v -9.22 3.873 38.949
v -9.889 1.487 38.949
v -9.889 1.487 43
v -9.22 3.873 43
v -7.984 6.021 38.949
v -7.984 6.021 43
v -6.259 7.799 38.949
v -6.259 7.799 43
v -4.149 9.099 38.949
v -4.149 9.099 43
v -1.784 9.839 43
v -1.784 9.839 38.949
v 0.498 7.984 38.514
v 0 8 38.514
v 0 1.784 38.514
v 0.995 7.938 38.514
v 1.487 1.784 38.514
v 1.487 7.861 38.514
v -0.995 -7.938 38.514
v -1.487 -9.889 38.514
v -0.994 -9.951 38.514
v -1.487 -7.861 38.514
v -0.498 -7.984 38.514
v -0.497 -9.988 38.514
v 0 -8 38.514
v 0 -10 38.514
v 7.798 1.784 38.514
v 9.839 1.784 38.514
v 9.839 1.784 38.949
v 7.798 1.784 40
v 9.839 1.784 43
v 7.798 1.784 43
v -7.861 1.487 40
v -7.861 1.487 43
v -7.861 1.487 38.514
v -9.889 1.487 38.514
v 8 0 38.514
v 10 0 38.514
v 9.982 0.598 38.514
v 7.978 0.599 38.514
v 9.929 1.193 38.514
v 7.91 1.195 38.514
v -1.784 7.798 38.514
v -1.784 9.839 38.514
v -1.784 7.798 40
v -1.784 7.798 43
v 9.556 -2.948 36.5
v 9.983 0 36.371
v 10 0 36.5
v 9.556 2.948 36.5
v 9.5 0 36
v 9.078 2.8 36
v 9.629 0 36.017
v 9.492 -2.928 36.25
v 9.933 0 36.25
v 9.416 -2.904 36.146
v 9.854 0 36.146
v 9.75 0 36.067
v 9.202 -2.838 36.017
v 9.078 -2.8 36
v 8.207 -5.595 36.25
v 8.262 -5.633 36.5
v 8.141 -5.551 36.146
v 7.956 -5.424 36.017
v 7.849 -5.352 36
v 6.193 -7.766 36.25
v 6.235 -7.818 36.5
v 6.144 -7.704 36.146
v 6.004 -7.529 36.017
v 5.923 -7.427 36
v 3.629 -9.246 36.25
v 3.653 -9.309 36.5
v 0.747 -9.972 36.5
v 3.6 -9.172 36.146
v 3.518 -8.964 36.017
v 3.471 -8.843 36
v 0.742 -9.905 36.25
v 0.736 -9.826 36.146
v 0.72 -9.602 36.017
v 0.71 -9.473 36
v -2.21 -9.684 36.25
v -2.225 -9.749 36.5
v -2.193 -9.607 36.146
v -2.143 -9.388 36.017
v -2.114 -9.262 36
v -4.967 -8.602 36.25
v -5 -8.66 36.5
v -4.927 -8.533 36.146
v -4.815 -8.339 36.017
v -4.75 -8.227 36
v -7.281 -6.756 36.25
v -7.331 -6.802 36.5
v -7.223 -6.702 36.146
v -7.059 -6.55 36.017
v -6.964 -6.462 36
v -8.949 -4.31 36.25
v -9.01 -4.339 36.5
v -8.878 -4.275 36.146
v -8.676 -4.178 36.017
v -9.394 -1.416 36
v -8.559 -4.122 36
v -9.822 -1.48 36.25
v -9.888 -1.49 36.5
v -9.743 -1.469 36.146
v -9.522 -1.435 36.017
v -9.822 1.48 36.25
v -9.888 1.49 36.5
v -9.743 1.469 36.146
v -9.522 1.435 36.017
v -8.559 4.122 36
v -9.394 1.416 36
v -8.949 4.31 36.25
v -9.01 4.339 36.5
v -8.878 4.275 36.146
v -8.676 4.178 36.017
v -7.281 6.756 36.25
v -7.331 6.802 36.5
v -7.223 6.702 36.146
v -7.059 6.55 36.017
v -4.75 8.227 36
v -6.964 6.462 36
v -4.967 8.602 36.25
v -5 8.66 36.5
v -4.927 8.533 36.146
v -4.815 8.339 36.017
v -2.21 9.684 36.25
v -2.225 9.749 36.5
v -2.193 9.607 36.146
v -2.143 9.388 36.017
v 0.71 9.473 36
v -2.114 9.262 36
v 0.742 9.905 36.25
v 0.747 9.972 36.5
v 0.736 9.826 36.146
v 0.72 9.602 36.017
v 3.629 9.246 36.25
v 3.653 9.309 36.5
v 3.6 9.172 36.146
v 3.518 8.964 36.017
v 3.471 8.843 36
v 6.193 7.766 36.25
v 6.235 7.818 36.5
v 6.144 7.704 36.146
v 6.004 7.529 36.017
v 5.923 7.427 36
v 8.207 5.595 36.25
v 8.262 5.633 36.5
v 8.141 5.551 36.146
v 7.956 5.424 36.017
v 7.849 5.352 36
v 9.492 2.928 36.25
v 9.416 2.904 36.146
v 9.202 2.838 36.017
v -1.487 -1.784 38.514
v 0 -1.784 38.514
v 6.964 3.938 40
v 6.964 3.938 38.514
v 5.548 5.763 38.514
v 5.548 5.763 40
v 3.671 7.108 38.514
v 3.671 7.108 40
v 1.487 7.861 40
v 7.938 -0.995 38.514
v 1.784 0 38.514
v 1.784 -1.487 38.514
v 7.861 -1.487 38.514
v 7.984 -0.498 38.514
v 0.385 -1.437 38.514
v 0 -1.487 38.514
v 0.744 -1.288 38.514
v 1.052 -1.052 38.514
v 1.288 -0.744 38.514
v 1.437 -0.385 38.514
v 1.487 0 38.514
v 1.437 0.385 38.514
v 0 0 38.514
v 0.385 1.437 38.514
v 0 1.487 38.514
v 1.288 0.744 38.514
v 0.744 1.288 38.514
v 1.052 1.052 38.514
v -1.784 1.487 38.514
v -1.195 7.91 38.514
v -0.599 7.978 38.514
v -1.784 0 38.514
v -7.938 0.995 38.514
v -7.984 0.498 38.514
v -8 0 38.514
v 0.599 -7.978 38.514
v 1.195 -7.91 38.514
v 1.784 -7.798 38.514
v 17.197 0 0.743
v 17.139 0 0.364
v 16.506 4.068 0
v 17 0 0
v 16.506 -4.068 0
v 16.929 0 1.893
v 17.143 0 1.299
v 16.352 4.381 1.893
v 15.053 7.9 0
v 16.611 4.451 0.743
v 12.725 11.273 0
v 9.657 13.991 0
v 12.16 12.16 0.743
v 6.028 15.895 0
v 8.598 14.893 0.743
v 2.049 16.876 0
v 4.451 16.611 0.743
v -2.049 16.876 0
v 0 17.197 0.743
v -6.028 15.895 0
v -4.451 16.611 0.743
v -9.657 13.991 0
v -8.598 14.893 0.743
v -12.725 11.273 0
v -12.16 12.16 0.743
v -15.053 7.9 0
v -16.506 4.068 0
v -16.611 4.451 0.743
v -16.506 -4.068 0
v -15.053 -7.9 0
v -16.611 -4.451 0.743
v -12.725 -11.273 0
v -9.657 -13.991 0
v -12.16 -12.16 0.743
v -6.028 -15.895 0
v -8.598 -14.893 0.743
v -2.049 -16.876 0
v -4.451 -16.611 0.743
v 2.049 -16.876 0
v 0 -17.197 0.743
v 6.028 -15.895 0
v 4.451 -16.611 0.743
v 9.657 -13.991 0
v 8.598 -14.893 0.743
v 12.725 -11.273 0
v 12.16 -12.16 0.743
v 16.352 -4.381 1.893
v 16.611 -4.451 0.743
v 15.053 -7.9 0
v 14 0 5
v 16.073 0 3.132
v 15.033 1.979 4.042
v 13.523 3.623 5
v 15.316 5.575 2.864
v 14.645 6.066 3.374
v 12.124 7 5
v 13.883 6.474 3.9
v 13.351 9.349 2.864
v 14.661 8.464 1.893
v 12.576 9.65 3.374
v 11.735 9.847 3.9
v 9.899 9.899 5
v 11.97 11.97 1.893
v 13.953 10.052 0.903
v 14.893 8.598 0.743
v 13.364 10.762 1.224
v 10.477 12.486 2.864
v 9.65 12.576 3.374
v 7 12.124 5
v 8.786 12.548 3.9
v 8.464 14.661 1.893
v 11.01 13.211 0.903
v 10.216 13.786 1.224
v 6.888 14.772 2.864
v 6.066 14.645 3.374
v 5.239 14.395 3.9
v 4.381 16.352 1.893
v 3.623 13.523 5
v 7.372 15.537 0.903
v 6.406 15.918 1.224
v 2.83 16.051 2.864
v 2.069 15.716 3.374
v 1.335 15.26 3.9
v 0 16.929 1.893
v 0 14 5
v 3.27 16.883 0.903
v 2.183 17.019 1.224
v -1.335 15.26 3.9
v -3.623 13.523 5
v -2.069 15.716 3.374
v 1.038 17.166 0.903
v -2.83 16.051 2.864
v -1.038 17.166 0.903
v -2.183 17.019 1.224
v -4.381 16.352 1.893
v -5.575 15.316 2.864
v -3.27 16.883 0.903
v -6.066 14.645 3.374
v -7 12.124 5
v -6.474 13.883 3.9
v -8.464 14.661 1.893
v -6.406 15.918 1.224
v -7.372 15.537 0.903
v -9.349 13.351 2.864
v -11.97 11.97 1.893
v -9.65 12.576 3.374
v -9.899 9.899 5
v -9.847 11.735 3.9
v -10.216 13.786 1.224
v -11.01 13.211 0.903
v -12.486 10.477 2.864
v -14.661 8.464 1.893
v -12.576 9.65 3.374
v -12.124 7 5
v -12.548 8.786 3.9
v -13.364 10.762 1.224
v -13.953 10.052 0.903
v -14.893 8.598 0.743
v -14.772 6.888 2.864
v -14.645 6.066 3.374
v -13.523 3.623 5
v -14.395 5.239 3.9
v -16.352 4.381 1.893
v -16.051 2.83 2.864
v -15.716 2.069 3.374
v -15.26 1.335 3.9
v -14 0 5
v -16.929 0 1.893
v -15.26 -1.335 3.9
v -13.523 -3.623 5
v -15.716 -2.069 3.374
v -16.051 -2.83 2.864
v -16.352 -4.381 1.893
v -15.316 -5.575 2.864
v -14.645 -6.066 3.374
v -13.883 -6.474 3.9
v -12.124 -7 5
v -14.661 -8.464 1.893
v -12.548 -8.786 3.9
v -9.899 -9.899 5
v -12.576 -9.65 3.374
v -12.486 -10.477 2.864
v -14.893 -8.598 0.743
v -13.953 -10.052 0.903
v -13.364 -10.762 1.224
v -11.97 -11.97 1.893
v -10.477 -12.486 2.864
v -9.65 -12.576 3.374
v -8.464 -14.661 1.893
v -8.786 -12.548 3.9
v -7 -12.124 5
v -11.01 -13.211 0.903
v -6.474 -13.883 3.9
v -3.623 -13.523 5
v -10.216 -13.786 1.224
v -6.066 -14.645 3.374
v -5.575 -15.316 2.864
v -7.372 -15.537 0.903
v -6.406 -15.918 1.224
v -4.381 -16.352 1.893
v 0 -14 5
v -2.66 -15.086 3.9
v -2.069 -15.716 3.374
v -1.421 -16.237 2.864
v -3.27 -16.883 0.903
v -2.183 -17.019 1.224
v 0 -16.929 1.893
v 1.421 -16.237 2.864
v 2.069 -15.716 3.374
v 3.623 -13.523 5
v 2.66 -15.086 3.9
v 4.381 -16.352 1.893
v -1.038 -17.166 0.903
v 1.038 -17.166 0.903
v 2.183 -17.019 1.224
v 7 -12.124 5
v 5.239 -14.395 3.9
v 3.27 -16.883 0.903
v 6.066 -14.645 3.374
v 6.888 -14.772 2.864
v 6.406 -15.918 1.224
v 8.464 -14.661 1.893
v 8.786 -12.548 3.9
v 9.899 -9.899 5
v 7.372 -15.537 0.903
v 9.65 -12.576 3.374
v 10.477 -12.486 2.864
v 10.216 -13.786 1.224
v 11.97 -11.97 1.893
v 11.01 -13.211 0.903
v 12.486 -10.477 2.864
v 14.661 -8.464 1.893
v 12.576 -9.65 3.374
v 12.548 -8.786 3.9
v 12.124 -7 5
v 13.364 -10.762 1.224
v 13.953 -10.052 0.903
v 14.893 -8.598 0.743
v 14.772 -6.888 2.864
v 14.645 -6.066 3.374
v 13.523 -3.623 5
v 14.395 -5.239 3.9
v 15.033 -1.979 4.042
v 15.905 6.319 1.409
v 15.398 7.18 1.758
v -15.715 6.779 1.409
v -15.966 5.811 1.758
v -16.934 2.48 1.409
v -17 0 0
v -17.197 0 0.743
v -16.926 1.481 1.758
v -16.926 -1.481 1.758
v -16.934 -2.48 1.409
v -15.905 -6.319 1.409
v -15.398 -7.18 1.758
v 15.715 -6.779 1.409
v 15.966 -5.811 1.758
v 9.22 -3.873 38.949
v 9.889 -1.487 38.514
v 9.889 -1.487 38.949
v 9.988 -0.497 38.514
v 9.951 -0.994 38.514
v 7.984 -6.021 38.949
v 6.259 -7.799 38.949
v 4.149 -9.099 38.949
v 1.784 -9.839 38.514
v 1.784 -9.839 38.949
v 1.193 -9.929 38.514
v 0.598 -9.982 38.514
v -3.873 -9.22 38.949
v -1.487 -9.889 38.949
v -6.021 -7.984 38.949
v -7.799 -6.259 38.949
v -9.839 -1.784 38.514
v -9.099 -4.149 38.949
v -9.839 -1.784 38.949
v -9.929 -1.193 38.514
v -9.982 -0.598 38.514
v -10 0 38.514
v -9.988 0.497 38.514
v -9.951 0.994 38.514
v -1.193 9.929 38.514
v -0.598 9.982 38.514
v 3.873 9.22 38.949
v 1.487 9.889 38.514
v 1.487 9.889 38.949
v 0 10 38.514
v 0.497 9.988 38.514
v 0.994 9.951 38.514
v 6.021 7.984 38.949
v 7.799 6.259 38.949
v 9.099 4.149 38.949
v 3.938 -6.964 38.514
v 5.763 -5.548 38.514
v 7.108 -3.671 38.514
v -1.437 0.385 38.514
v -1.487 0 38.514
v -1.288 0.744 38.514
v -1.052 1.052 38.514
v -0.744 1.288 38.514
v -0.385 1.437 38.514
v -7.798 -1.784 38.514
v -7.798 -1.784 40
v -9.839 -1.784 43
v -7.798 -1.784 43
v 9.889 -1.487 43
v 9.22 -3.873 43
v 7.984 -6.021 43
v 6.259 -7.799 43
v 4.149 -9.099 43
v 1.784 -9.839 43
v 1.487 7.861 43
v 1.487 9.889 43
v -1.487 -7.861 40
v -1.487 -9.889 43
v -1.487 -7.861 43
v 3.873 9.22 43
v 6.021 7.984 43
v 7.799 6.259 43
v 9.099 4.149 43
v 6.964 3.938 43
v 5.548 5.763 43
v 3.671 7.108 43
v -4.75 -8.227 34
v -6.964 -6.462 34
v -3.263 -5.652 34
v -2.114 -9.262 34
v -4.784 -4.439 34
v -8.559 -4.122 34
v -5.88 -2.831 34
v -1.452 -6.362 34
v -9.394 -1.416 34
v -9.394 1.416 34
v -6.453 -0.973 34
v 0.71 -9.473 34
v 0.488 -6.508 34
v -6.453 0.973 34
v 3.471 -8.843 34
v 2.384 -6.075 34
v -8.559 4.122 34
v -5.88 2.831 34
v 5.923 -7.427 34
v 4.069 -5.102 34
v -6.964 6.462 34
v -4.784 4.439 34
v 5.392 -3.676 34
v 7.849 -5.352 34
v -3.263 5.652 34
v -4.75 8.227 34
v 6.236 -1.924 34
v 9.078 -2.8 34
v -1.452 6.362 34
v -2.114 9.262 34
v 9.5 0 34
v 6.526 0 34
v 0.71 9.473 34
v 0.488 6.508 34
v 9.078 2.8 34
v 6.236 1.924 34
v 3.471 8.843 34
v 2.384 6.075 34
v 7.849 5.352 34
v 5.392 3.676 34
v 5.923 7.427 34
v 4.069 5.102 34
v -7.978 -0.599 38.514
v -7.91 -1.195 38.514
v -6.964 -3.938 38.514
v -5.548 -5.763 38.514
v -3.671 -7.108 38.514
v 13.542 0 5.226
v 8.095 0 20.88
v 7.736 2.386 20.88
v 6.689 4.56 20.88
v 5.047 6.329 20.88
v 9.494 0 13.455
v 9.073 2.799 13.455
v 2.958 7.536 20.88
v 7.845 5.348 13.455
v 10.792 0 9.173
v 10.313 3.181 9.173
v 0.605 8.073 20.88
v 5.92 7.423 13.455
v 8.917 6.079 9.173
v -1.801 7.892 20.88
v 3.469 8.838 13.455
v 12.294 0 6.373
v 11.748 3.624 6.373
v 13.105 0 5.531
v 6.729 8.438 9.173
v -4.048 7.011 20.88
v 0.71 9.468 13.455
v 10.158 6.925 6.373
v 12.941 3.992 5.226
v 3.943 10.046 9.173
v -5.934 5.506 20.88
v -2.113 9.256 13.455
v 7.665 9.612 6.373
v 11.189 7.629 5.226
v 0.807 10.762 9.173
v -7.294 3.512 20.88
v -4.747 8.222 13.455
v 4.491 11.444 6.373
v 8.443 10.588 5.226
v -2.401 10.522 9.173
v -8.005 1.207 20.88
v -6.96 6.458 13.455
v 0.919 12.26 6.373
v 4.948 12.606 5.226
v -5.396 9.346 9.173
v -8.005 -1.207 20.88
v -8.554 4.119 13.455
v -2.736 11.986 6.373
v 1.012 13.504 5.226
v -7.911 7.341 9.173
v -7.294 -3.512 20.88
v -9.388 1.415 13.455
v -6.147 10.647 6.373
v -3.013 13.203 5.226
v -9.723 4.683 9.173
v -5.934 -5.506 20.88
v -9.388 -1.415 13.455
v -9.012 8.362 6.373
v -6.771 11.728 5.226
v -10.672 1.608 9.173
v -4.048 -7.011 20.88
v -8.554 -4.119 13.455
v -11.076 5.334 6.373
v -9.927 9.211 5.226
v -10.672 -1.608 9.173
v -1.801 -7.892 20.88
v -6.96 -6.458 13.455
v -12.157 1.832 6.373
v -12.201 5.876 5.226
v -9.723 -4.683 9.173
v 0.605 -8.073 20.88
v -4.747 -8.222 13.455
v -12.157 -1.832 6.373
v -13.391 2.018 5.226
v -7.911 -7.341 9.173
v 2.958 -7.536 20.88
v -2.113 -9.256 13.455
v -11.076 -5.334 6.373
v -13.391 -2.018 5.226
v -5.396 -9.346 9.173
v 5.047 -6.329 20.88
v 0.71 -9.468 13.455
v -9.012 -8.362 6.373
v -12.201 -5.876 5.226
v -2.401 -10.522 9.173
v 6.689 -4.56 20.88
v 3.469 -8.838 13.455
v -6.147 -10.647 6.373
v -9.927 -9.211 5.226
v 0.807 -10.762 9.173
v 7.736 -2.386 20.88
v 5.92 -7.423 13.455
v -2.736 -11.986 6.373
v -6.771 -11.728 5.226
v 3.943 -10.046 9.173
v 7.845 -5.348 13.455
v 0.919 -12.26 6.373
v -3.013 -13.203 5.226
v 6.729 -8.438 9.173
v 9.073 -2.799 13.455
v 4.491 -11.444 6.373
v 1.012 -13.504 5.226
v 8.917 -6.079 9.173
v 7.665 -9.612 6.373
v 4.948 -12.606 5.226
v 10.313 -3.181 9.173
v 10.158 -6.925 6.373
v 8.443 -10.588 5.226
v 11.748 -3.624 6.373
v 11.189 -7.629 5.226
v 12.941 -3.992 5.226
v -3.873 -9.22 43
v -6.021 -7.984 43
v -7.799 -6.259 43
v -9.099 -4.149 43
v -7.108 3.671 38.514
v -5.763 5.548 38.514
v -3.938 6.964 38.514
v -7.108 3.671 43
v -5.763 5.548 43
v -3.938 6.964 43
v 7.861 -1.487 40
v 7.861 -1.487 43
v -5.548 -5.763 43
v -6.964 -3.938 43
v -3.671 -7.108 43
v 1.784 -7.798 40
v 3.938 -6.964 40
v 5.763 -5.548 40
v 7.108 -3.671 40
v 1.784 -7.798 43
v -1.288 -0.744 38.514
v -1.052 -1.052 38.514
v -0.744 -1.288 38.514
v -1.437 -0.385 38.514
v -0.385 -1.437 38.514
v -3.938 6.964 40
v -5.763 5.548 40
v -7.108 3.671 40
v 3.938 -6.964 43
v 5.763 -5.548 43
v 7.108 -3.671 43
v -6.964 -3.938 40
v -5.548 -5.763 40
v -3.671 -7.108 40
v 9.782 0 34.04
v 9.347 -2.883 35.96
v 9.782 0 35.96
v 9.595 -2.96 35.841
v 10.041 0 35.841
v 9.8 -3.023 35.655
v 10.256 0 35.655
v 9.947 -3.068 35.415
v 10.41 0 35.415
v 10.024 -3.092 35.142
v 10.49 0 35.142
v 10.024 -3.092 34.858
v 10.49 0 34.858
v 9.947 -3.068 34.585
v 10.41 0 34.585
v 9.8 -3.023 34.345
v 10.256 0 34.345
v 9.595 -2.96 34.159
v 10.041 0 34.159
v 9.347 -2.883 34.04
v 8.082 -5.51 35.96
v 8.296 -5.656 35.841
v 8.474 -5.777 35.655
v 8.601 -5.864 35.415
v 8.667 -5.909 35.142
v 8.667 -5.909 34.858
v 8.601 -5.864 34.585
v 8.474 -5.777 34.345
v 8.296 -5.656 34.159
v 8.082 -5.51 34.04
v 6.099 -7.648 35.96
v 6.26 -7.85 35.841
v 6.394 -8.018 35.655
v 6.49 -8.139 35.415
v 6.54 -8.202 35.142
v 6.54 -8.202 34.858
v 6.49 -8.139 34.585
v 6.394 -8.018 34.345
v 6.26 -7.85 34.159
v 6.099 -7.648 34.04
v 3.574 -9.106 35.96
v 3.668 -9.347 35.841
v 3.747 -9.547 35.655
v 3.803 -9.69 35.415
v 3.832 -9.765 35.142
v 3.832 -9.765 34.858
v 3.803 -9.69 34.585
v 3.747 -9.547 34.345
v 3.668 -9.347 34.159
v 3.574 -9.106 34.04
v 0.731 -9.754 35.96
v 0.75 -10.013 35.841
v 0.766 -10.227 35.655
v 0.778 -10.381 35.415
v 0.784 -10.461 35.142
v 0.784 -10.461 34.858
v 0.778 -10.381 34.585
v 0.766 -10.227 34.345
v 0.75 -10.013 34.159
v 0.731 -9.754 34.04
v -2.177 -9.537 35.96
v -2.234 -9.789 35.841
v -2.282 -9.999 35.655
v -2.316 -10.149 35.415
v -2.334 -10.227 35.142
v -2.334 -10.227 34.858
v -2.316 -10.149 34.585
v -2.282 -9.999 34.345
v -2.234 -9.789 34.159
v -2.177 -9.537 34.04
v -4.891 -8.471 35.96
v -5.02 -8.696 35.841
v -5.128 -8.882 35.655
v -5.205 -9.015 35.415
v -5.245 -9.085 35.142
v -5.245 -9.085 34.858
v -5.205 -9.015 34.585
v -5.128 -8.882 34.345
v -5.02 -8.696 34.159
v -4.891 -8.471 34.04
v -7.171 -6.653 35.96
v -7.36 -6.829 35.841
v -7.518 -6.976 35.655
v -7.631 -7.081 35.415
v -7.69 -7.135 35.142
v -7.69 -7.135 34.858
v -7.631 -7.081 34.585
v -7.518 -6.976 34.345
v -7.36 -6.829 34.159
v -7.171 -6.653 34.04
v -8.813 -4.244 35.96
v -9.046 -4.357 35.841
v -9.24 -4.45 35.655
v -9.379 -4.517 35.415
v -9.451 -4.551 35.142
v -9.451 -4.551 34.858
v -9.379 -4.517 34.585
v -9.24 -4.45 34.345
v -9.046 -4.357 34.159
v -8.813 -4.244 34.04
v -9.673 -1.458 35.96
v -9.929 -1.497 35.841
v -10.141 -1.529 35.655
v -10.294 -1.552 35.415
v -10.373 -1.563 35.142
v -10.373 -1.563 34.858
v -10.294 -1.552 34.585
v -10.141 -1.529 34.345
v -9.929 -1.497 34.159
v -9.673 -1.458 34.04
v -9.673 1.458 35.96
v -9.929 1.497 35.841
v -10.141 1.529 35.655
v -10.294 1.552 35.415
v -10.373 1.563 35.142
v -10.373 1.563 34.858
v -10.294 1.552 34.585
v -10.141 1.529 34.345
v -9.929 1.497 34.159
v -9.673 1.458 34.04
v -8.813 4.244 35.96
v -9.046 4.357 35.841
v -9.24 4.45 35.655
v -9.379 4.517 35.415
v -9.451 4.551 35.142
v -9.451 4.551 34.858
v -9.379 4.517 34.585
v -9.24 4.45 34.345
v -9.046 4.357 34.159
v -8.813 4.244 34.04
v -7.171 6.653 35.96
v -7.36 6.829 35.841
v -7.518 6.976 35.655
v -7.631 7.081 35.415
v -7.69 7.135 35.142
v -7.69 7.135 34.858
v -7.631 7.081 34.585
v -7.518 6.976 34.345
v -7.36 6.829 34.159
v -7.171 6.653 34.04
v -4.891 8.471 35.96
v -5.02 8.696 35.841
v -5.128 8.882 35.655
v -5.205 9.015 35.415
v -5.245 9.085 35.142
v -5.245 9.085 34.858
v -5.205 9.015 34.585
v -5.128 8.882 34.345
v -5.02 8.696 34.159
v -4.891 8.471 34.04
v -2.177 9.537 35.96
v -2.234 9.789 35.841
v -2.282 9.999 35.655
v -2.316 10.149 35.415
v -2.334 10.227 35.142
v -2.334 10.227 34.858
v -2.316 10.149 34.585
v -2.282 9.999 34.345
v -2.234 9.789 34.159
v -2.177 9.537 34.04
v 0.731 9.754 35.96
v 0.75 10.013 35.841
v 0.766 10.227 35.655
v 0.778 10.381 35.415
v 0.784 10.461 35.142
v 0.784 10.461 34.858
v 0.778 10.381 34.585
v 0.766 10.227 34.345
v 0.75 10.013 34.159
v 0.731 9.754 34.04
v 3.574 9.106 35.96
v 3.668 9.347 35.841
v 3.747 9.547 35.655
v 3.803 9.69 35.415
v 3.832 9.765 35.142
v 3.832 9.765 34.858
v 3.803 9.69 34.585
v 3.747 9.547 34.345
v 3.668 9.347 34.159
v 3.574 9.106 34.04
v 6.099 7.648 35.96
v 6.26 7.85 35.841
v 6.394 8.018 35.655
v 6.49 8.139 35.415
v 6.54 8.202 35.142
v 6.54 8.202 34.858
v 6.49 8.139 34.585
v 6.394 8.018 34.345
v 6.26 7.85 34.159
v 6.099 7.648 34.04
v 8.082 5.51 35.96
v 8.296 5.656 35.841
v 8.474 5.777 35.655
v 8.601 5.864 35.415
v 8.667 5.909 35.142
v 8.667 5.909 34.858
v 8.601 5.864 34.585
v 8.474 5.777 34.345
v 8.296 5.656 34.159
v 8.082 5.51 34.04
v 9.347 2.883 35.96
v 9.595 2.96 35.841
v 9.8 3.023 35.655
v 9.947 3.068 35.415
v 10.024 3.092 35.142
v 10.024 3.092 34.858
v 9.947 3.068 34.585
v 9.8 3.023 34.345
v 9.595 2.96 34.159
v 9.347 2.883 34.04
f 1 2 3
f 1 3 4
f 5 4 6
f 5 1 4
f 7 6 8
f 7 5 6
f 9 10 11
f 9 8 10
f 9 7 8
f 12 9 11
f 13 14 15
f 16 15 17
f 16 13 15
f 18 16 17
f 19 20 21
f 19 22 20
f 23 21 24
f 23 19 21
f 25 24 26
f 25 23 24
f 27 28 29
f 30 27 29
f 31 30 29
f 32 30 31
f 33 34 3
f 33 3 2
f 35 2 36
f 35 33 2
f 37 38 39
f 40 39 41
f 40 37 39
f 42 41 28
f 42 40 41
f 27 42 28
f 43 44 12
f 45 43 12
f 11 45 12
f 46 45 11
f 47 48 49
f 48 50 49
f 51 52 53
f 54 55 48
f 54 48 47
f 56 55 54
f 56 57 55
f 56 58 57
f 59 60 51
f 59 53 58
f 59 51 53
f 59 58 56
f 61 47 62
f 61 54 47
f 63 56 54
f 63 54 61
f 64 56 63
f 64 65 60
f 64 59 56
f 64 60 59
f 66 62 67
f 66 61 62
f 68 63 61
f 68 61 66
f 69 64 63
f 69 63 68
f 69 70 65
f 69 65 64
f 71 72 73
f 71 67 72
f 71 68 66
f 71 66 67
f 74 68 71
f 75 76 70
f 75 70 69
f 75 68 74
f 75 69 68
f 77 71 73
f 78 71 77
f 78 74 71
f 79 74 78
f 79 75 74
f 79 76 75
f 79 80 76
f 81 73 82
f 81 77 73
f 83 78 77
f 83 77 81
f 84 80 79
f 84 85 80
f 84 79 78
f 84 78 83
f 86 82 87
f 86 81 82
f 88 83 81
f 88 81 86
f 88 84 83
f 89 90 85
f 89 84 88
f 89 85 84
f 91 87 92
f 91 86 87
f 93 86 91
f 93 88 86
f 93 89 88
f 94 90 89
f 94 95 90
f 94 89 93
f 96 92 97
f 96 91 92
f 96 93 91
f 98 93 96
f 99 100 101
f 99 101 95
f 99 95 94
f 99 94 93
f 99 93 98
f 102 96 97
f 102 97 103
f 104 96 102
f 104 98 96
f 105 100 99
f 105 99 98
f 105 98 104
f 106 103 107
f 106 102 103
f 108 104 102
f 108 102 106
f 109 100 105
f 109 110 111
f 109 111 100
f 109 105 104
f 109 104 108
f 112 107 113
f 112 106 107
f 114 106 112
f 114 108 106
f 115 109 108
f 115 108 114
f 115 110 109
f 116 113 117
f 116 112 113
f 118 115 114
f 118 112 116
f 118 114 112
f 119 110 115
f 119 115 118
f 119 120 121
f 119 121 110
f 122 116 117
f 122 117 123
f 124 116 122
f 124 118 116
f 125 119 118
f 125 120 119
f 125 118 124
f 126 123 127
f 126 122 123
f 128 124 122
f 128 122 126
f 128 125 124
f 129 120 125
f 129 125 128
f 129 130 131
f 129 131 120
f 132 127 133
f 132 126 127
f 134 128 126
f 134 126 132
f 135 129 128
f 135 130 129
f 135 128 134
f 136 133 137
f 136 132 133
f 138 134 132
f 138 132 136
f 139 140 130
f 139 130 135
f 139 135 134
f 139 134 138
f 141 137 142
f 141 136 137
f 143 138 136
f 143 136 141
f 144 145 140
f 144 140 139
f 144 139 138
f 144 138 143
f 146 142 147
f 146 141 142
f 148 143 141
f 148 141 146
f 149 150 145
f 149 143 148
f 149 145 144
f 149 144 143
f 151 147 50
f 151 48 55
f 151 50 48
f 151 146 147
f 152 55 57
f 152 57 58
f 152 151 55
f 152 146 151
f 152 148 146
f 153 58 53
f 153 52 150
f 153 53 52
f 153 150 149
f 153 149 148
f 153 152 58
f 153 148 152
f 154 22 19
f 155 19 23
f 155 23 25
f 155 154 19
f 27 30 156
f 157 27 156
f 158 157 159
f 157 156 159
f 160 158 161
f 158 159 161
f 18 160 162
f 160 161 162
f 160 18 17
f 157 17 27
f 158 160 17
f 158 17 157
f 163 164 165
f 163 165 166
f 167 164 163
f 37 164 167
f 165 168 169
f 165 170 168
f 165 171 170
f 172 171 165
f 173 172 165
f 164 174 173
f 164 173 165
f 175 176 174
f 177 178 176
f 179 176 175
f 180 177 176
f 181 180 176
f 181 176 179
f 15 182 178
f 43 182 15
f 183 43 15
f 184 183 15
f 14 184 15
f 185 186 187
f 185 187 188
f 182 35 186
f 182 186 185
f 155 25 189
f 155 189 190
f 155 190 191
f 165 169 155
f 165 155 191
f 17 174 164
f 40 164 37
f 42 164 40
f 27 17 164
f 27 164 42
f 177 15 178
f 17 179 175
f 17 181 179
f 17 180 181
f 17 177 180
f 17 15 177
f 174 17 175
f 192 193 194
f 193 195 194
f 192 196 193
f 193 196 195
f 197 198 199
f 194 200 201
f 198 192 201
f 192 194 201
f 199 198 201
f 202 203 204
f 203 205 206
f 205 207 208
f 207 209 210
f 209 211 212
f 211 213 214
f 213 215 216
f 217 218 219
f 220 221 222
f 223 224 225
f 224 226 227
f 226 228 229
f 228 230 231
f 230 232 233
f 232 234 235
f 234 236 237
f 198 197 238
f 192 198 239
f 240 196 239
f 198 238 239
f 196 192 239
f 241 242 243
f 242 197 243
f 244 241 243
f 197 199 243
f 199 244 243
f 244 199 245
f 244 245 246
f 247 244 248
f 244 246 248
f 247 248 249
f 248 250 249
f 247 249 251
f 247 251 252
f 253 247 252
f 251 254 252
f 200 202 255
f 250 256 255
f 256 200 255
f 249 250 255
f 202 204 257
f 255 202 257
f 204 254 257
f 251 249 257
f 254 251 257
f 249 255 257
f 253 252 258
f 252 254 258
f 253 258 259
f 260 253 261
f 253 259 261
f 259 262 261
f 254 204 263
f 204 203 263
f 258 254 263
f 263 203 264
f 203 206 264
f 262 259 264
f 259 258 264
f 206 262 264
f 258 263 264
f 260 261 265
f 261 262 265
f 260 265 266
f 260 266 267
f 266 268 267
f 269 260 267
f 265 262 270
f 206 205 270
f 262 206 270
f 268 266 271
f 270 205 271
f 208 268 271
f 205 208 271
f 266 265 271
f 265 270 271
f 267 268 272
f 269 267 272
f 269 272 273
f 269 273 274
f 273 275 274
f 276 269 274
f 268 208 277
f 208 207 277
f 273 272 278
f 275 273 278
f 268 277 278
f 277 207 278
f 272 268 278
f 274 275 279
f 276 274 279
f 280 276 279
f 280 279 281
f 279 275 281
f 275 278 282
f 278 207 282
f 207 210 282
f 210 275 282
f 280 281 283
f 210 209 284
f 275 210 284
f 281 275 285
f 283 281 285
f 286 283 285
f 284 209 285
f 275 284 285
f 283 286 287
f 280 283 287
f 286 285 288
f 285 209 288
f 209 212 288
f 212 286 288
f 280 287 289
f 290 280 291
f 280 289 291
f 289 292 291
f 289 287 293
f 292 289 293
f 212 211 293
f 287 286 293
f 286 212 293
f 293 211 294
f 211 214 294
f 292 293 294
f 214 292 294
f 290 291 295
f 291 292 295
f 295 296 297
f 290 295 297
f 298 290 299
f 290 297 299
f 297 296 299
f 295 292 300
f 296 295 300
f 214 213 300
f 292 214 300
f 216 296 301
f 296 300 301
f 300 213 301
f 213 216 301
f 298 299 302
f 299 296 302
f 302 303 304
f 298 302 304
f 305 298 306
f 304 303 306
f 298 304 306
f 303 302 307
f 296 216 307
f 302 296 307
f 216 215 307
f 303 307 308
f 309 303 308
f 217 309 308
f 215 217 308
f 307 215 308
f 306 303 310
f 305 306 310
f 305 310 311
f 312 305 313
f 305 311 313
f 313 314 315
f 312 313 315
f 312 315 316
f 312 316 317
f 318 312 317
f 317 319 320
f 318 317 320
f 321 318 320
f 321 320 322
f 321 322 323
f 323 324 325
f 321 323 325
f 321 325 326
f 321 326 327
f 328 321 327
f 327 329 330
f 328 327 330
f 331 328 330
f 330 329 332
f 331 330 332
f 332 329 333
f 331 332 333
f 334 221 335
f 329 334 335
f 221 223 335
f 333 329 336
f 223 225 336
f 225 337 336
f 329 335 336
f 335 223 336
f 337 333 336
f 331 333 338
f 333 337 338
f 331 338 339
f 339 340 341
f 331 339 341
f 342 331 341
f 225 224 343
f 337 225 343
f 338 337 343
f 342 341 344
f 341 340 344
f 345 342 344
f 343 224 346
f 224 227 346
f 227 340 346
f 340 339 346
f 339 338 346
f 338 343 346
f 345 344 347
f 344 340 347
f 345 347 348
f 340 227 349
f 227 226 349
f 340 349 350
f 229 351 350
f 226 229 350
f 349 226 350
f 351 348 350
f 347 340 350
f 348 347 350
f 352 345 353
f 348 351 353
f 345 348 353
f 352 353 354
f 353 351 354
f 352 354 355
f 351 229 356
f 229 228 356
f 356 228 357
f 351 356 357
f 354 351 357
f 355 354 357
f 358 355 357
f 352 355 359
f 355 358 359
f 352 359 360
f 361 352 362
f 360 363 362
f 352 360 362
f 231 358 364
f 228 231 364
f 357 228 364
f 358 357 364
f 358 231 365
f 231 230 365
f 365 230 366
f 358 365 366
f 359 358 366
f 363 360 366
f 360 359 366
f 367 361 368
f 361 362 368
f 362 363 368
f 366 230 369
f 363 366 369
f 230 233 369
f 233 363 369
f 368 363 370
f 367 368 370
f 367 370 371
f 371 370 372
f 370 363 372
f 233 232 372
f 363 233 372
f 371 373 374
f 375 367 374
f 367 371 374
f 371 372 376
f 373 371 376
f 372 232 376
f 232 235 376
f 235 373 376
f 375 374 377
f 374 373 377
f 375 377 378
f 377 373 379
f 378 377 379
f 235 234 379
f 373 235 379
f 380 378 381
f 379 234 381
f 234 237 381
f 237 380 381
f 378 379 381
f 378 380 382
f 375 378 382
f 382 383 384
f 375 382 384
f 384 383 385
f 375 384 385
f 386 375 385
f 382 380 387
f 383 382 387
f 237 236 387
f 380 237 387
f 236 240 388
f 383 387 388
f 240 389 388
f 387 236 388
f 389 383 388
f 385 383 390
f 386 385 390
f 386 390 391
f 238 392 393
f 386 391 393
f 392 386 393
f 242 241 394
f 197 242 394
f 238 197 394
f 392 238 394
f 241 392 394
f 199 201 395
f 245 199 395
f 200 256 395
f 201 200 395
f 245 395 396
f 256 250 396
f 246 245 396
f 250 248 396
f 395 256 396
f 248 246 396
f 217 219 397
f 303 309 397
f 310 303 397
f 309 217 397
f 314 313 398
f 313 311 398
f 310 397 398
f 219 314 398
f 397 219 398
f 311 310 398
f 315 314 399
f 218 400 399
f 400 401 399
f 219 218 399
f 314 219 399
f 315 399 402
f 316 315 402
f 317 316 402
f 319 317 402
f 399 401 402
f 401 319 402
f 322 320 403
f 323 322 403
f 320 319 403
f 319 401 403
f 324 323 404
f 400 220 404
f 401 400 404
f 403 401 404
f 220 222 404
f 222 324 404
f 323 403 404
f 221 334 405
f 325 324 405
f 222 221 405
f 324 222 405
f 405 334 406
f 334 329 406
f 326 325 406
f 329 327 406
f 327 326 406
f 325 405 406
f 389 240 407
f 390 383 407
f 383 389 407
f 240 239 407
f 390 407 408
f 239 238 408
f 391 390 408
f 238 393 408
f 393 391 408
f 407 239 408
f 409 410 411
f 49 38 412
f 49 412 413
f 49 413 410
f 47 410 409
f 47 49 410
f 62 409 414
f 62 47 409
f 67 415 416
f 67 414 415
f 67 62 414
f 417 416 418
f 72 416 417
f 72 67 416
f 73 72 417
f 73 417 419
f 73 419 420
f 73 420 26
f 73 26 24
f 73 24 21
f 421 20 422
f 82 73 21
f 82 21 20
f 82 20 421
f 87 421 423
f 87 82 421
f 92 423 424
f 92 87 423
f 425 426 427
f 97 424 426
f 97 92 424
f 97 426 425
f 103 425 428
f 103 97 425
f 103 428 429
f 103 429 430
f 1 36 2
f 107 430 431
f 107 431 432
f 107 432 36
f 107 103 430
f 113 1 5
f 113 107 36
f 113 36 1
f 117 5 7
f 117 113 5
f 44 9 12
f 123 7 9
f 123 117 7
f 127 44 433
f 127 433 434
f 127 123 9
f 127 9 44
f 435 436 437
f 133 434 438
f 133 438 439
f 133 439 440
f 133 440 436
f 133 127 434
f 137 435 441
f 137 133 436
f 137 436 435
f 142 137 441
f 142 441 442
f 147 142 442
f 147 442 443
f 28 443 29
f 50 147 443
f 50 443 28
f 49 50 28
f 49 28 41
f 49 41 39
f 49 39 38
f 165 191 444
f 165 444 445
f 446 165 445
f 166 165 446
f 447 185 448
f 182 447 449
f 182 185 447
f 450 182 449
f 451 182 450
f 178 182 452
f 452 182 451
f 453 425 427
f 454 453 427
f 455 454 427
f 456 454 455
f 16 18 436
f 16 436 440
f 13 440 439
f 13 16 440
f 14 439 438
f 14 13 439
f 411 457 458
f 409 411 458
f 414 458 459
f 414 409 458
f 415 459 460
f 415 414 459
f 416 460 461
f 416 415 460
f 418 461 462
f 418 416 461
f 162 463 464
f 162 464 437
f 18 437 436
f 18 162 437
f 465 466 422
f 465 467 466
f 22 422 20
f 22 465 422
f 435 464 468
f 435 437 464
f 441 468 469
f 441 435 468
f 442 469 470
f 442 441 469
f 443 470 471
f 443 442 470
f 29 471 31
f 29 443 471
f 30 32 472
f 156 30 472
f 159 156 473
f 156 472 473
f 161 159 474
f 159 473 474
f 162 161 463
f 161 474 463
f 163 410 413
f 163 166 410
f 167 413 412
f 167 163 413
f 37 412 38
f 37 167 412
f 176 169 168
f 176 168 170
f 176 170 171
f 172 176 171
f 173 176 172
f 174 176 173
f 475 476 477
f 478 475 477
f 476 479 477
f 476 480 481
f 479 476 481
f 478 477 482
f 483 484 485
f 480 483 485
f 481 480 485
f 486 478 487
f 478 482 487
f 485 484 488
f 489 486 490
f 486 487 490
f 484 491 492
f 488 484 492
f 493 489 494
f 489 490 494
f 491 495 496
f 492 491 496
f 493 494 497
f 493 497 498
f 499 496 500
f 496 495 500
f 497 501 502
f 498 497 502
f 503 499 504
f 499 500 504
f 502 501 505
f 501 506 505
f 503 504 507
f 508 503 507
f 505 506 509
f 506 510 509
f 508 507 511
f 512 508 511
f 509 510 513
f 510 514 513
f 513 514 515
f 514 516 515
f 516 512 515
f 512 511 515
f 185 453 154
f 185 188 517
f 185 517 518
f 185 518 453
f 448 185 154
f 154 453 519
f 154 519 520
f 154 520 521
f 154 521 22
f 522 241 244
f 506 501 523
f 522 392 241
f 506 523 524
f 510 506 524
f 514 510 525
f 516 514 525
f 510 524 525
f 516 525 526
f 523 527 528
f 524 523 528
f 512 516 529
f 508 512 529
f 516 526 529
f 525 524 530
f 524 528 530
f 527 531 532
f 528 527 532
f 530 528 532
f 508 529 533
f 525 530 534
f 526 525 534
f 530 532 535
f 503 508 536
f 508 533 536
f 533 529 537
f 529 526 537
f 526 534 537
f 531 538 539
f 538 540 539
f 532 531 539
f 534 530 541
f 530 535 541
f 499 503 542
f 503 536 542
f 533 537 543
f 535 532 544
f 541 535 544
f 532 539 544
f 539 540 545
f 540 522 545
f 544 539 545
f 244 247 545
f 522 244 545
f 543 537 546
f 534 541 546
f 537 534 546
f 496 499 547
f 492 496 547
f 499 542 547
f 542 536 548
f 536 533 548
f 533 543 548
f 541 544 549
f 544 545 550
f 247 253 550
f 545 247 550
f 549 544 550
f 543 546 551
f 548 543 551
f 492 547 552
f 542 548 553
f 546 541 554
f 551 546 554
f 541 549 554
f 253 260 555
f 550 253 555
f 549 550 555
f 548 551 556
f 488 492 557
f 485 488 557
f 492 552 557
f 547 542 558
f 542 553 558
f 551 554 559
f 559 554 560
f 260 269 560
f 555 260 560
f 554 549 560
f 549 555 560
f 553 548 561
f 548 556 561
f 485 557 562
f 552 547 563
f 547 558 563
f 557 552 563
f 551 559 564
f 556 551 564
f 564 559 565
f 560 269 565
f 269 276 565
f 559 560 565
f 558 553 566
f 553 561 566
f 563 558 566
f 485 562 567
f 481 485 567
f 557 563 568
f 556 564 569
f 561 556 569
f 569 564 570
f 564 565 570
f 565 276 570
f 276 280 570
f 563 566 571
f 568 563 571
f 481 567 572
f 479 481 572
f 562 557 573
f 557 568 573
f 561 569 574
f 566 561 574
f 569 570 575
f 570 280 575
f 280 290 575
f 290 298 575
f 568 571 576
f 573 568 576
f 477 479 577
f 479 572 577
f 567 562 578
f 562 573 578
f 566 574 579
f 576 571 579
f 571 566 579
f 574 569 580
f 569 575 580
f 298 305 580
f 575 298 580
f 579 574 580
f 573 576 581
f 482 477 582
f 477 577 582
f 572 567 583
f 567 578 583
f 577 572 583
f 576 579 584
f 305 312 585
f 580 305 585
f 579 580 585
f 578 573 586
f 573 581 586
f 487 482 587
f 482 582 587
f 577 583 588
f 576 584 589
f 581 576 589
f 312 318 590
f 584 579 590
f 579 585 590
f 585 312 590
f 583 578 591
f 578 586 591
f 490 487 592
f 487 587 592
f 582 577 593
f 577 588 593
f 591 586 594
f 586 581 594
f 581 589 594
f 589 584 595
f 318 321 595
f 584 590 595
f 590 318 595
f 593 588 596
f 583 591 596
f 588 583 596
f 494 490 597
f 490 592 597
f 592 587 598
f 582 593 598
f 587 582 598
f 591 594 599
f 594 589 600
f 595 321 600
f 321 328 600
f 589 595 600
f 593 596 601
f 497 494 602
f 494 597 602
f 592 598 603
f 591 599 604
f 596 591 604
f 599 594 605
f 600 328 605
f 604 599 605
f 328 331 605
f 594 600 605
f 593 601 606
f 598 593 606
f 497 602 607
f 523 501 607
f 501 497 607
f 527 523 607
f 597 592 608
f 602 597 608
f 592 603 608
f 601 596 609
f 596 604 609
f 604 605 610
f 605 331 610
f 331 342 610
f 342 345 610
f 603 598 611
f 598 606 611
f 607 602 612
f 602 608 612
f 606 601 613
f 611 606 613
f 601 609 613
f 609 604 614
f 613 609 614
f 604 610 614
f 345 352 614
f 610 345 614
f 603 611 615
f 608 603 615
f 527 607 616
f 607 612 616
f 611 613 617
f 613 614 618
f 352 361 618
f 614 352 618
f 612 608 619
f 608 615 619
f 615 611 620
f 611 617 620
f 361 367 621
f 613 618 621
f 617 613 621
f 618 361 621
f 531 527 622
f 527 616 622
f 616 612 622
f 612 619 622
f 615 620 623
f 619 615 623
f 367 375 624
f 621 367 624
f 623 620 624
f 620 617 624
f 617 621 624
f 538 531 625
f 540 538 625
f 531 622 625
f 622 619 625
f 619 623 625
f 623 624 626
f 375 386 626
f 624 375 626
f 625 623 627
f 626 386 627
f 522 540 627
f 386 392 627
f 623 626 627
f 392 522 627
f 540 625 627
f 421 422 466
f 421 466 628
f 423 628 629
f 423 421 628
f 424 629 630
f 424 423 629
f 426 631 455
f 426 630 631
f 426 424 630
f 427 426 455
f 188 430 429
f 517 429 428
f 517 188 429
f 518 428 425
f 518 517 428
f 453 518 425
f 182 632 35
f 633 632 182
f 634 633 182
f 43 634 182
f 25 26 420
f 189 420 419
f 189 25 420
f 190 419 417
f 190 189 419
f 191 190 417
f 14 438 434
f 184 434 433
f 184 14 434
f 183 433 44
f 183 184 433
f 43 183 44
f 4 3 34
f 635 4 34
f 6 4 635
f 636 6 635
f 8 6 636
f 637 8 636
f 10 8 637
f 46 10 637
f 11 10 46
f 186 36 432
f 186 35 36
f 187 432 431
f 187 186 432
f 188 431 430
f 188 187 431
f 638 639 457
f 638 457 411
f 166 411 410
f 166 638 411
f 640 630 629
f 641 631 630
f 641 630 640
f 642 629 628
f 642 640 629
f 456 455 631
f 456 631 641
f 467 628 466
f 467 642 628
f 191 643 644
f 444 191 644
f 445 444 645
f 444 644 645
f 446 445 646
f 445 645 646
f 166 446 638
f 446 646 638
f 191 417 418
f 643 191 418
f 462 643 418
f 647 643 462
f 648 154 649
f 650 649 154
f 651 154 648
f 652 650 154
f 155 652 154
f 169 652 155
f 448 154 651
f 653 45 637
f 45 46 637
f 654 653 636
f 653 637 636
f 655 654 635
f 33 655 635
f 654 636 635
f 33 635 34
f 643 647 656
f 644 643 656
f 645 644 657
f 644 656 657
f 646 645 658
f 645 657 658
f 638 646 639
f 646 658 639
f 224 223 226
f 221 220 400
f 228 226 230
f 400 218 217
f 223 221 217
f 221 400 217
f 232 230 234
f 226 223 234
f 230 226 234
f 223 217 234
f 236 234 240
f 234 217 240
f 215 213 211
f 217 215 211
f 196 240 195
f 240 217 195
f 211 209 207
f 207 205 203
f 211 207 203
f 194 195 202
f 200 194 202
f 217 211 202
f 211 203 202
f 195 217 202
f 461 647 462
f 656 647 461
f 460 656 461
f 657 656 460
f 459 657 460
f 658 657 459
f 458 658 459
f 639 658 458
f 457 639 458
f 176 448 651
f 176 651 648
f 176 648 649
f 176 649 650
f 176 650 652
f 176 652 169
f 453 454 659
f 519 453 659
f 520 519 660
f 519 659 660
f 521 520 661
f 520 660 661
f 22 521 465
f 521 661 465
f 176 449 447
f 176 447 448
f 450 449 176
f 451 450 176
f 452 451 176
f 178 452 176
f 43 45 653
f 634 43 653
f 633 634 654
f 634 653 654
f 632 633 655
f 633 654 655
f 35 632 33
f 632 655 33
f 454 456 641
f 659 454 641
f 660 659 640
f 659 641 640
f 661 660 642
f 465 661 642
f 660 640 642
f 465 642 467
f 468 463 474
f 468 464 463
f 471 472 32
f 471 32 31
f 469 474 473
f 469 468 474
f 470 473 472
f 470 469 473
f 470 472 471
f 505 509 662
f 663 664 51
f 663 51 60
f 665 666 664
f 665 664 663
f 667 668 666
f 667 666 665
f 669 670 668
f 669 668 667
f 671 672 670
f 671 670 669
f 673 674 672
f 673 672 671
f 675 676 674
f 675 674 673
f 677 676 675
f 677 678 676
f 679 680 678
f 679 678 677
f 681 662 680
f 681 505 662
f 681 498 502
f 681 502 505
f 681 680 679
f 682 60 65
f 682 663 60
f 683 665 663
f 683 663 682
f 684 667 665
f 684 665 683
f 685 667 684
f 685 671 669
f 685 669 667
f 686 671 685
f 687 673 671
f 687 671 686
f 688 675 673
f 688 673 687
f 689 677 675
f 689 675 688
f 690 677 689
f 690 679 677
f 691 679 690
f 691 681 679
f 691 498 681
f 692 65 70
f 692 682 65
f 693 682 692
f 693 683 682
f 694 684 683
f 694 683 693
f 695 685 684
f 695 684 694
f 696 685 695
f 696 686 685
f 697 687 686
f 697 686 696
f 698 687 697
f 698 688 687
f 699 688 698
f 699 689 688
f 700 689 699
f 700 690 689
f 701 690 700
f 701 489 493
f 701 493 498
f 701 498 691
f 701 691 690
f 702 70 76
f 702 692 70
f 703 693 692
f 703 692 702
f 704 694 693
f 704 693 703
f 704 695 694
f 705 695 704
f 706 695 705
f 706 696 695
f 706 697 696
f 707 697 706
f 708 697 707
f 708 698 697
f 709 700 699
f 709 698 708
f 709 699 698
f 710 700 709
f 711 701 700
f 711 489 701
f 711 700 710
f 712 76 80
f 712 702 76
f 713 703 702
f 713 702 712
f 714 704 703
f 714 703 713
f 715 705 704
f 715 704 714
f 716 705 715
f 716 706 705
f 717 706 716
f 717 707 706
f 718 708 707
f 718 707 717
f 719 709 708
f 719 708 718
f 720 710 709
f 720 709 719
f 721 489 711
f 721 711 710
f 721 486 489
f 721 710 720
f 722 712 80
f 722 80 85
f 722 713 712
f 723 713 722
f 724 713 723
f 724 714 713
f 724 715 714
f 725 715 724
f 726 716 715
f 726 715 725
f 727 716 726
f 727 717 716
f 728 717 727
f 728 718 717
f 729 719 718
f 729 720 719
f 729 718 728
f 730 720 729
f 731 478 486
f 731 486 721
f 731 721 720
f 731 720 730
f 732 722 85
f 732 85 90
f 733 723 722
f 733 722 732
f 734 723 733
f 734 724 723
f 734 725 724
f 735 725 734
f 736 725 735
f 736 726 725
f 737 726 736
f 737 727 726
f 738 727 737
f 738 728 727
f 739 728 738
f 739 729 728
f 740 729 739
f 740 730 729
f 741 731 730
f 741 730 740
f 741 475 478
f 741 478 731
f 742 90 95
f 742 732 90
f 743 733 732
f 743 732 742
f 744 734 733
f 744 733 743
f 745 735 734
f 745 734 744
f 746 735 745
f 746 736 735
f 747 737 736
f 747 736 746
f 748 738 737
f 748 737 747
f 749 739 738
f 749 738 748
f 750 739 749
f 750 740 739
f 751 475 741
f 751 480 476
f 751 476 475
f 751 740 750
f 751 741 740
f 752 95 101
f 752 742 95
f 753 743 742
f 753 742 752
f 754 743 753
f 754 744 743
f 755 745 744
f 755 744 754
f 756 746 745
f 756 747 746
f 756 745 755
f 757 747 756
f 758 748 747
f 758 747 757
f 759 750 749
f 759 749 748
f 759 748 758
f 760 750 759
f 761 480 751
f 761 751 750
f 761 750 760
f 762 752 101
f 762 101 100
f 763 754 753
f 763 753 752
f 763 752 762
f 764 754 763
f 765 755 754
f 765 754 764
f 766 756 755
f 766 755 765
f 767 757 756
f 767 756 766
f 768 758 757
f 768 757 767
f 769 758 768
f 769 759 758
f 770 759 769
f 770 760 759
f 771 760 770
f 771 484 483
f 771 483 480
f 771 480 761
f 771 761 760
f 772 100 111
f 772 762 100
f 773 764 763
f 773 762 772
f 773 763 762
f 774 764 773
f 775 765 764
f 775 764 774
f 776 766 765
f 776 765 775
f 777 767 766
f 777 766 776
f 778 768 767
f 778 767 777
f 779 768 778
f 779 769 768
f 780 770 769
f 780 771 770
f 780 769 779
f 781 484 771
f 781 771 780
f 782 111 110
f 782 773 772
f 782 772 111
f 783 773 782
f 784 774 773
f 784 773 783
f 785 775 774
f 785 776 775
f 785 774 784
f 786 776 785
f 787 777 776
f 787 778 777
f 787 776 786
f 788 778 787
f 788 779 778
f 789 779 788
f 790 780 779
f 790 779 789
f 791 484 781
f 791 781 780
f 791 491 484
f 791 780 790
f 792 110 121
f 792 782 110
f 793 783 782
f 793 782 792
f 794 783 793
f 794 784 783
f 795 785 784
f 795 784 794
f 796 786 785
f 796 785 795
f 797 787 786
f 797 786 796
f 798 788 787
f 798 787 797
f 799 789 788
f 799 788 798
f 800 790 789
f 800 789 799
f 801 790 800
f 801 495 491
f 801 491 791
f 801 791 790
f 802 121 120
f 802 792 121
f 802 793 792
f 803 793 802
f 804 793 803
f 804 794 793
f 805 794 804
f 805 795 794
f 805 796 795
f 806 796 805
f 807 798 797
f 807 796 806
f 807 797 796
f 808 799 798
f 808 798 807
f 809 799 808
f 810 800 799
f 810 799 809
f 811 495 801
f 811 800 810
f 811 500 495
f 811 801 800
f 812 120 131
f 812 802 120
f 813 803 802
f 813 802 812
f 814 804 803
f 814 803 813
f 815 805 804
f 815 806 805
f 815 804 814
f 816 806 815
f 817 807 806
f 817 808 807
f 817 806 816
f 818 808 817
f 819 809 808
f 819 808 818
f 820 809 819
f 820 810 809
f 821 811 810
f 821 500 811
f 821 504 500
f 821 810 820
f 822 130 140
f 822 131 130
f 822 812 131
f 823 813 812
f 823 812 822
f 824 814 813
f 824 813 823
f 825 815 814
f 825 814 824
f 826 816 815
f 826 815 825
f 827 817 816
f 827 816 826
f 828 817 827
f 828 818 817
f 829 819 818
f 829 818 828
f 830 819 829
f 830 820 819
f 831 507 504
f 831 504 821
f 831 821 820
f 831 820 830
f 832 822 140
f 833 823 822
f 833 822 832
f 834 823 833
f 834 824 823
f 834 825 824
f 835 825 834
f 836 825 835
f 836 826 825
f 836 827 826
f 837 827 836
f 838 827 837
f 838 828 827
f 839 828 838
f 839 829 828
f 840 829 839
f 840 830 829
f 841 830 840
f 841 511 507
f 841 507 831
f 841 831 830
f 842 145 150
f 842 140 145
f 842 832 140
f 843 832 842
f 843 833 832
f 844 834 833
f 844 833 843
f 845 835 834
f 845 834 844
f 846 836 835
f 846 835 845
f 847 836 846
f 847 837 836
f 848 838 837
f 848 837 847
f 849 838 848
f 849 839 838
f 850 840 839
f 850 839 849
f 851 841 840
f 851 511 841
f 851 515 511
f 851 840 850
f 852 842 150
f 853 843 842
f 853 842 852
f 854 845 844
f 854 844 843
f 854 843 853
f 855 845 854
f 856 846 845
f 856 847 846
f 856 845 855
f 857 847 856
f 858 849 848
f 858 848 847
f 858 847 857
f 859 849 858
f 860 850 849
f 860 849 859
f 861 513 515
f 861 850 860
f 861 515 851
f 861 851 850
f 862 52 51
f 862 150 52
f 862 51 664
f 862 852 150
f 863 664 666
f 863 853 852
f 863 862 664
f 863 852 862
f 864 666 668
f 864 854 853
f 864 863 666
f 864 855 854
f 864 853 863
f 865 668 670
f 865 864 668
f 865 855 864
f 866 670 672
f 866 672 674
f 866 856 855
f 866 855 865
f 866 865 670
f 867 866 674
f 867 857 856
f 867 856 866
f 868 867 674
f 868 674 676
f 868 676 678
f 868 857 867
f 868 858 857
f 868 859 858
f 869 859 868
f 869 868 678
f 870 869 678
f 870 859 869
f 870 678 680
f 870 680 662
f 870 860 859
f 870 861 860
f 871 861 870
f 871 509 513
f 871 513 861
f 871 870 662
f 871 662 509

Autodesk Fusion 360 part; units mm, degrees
sketch "Tura" plane through (0, 0, 0) normal (0, 1, 0) x (1, 0, 0)
  line L0 (0, 0) -> (17, 0)
  line L1 (0, 0) -> (0, -38.5138)
  line L2 (0, -38.5138) -> (0, -35)
  line L3 (0, -38.5138) -> (0, -35)
  line L4 (0, 0) -> (0, -5)
  line L5 (14, -5) -> (0, -5)
  spline S0 degree 5 poles (6.5259, -34) (6.6855, -32.318) (7.0209, -29.0147) (7.5725, -24.2418) (8.412, -18.2671) (9.7194, -11.7648) (11.1016, -7.8229) (12.4226, -5.9311) (13.4497, -5.2188) (14, -5) knots 0 0 0 0 0 0 0.2 0.4 0.6 0.8 1 1 1 1 1 1
  line L6 (12.8092, -5.4735) -> (15.1908, -4.5265)
  spline S1 degree 5 poles (14, -5) (14.3724, -4.7164) (15.065, -4.1591) (15.9469, -3.3525) (16.8041, -2.3367) (17.2264, -1.3701) (17.2496, -0.692) (17.1232, -0.2556) (17.015, -0.0297) (17, 0) knots 0 0 0 0 0 0 0.1 0.2 0.3 0.4 0.415205 0.415205 0.415205 0.415205 0.415205 0.415205
  line L7 (17.1967, -0.3896) -> (16.8033, 0.3896)
  line L8 (0, -37.3622) -> (0, -38.5138)
  line L9 (0, -36) -> (9, -36)
  line L10 (0, -38) -> (0, -36)
  line L11 (8, -40) -> (8, -43)
  line L12 (8, -43) -> (10, -43)
  line L13 (10, -43) -> (10, -36.5)
  line L14 (9.5, -36) -> (9, -36)
  line L15 (0, -36) -> (9.5003, -36)
  line L16 (9.5, -34) -> (0, -34)
  line L17 (0, -34) -> (0, -36)
  arc A0 (9.5005, -34) -> (9.5, -34) centre (9.5, -36.5) ccw
  arc A1 (9.5003, -36) -> (9.5005, -34) centre (9.5003, -35) ccw
  arc A2 (10, -36.5) -> (9.5, -36) centre (9.5, -36.5) ccw
  line L18 (-1.7845, -43) -> (1.4873, -43)
  line L19 (1.4873, -43) -> (1.4873, -38.5138)
  line L20 (1.4873, -38.5138) -> (-1.7845, -38.5138)
  line L21 (-1.7845, -38.5138) -> (-1.7845, -43)
  line L22 (1.4873, -38.5138) -> (8, -38.5138)
  line L23 (8, -38.5138) -> (8, -40)
  point P0 (10, -35)
  dimension "d1" = 17
  dimension "d3" = 10
  dimension "d5" = 3
  dimension "d6" = 2.5
  dimension "d7" = 1
  dimension "d8" = 0.5
revolve "Revolve2" add sketch "Tura" angle 360 about axis through (0, 0, 0) along (0, 0, 1) contours L0 L1 L4 L5 S1 | L1 L5 S0 L16 | L1 L2 L3 L9 L15 L16 L17 A0 | L9 L14 L15 A0 A1 | L1 L2 L3 L8 L9 L10 L11 L12 L13 L15 A0 L20 L22 L23 | L9 L13 L14 L15 A0 A2
extrude "Extrude2" cut sketch "Tura" along normal blind 10 contours L18 L19 L20 L21
pattern_circular "C-Pattern1" count 4 over 360 about axis through (0, 0, 0) along (0, 0, 1) of "Extrude2"
